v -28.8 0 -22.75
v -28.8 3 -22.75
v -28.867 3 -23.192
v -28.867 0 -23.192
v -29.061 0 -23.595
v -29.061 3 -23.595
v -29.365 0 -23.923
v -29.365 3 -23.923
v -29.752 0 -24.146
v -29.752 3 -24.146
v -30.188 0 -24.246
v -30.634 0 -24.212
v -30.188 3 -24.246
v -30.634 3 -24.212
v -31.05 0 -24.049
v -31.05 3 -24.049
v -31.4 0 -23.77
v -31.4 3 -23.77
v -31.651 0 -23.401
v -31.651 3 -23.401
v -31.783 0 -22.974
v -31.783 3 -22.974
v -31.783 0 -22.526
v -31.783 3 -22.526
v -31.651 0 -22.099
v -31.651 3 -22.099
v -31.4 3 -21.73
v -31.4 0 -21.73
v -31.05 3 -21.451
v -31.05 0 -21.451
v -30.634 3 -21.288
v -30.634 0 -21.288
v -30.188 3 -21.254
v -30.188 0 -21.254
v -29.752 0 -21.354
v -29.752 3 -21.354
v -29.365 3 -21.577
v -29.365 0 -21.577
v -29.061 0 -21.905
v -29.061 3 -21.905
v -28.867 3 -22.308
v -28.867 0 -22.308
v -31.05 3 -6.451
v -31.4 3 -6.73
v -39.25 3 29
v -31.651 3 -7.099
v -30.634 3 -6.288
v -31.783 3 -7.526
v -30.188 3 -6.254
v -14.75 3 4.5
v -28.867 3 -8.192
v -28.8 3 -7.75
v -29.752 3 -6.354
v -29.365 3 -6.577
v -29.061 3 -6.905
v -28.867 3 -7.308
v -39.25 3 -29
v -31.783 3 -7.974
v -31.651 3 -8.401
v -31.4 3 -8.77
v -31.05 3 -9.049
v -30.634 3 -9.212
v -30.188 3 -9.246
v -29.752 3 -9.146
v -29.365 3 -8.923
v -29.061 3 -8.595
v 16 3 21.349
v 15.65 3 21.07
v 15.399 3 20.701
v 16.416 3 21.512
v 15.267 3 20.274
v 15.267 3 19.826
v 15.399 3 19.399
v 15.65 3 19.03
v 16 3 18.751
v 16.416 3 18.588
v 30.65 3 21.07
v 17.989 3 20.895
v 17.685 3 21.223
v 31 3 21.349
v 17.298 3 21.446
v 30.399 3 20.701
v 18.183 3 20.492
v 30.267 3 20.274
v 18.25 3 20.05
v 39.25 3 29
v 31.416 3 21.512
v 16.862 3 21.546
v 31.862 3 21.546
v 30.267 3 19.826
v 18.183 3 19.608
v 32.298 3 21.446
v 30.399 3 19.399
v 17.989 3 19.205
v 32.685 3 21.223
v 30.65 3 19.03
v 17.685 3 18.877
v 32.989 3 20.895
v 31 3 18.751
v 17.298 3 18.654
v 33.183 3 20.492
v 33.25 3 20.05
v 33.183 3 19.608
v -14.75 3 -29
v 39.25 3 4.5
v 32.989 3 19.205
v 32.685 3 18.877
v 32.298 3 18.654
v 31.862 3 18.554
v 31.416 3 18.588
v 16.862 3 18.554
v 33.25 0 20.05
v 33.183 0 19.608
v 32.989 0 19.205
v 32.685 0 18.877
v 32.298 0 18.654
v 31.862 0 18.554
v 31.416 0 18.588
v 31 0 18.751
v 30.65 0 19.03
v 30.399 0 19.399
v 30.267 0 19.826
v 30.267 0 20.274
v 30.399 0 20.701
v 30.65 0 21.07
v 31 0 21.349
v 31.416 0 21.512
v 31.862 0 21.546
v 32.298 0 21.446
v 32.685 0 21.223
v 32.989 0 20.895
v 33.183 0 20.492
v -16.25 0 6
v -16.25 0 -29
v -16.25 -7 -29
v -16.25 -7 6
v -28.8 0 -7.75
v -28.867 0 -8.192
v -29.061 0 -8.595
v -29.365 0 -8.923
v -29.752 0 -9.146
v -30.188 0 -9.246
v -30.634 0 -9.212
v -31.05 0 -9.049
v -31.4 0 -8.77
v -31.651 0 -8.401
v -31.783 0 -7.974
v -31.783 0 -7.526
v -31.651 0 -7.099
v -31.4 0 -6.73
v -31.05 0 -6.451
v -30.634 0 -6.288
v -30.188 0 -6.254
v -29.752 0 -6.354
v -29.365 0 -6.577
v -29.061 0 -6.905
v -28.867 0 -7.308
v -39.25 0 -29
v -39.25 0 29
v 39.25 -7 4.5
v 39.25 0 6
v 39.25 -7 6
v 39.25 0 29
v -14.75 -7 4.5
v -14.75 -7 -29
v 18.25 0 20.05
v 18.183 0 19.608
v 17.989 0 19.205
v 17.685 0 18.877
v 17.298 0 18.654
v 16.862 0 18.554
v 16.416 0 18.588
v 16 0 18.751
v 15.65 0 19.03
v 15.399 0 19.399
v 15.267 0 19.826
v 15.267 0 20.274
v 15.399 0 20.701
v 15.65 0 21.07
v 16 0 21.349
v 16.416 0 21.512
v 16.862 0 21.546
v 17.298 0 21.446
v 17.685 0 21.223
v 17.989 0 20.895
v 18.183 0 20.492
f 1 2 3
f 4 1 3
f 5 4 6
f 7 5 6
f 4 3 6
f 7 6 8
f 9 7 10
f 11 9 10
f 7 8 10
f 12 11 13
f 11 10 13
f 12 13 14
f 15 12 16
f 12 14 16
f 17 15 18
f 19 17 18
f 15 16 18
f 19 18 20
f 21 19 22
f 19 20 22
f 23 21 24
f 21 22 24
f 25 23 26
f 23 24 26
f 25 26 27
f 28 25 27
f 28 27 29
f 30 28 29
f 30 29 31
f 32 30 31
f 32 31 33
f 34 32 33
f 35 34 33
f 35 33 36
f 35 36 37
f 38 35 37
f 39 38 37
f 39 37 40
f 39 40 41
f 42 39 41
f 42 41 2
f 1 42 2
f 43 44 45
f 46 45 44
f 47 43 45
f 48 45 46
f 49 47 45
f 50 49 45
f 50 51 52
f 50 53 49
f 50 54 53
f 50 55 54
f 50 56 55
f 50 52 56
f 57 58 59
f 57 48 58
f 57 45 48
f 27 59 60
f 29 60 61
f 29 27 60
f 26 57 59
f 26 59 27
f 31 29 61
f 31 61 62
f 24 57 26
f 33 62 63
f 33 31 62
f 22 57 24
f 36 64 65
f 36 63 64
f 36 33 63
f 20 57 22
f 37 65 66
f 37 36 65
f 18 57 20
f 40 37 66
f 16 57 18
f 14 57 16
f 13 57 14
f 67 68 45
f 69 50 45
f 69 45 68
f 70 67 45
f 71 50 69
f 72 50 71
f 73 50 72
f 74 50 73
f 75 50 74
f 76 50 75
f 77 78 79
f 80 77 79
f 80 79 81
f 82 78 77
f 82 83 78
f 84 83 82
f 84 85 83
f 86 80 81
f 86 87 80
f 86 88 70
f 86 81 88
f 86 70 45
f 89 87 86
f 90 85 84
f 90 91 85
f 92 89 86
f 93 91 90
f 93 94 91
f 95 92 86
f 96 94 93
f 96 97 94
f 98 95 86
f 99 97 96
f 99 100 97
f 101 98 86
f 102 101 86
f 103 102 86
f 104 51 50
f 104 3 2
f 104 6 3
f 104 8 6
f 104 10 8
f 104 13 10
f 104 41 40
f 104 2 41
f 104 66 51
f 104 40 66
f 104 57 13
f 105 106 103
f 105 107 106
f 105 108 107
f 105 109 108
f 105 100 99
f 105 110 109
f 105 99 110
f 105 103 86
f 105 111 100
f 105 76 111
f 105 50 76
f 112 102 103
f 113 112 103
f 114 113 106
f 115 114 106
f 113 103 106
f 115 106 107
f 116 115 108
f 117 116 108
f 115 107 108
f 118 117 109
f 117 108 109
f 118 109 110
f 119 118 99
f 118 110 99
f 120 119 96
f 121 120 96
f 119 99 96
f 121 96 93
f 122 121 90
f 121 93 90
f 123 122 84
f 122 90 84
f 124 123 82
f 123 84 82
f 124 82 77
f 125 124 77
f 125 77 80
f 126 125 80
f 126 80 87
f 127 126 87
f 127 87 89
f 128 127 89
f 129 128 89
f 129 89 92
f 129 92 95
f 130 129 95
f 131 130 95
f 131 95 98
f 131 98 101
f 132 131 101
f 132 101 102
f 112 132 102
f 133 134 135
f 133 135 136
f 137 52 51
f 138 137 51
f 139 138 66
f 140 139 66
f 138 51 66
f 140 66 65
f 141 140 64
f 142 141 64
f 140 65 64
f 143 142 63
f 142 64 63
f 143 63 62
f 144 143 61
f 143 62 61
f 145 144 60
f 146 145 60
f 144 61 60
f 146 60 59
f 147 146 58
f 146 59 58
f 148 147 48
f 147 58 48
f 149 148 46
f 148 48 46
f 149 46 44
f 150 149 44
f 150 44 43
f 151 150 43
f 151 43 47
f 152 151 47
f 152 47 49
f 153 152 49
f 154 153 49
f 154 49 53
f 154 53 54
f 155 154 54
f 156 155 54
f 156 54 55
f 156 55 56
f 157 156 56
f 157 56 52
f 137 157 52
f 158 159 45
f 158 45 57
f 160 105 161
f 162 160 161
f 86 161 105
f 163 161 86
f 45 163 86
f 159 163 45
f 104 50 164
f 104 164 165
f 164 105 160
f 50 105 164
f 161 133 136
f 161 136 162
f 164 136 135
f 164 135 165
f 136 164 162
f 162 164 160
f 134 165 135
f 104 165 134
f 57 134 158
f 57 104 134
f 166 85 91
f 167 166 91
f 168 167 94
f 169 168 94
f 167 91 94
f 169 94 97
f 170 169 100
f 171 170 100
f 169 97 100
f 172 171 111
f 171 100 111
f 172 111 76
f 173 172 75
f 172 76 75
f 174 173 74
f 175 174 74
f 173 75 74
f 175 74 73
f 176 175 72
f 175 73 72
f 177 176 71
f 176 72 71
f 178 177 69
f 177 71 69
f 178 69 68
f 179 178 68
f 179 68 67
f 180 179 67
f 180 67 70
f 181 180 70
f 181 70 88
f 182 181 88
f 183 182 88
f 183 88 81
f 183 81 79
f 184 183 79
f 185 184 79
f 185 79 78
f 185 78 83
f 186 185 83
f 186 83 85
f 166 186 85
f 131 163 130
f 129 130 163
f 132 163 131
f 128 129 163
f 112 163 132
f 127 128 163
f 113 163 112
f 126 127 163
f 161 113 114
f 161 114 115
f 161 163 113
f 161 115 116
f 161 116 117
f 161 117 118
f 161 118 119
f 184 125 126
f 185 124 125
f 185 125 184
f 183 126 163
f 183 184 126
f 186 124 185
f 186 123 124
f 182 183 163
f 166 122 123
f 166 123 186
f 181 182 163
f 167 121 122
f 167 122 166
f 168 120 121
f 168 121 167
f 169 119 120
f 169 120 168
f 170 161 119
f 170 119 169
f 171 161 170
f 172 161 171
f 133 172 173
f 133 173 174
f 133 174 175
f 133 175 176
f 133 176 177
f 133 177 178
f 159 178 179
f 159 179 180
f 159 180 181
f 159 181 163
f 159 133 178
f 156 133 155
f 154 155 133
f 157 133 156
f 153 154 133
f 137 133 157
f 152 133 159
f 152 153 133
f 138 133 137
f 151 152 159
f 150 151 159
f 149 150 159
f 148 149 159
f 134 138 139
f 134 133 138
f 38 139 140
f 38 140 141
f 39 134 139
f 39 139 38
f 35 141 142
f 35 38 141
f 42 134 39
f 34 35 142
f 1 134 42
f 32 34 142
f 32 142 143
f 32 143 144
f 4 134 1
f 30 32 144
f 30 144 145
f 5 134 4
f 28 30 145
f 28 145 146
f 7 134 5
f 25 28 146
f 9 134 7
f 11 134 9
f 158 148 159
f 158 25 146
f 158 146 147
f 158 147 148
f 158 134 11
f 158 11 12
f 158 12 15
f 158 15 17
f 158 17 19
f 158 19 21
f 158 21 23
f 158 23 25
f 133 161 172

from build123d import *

# Parameters (mm, degrees)
SALIENTE_EXTRUIR1_DEPTH = 3
CROQUIS2_R              = 1.5
CORTAR_EXTRUIR2_DEPTH   = 4
SALIENTE_EXTRUIR2_DEPTH = 10


with BuildPart() as part:
    # Croquis1 → Saliente-Extruir1 (new body)
    with BuildSketch(Plane(origin=(0, 0, 0), x_dir=(1, 0, 0), z_dir=(0, 1, 0))):
        Polygon((-16.25, 29), (-16.25, -6), (39.25, -6), (39.25, -29), (-39.25, -29), (-39.25, 29), align=None)
    extrude(amount=SALIENTE_EXTRUIR1_DEPTH)

    # Croquis2 → Cortar-Extruir2 (cut, through all)
    with BuildSketch(Plane(origin=(0, 3, 0), x_dir=(1, 0, 0), z_dir=(0, 1, 0))):
        with Locations((31.75, -20.05)):
            Circle(CROQUIS2_R)
        with Locations((16.75, -20.05)):
            Circle(CROQUIS2_R)
        with Locations((-30.3, 22.75)):
            Circle(CROQUIS2_R)
        with Locations((-30.3, 7.75)):
            Circle(CROQUIS2_R)
    extrude(amount=-CORTAR_EXTRUIR2_DEPTH, mode=Mode.SUBTRACT)

    # Croquis3 → Saliente-Extruir2 (add)
    with BuildSketch(Plane(origin=(0, 3, 0), x_dir=(1, 0, 0), z_dir=(0, 1, 0))):
        Polygon((-16.25, 29), (-16.25, -6), (39.25, -6), (39.25, -4.5), (-14.75, -4.5), (-14.75, 29), align=None)
    extrude(amount=-SALIENTE_EXTRUIR2_DEPTH)


solid = part.part
